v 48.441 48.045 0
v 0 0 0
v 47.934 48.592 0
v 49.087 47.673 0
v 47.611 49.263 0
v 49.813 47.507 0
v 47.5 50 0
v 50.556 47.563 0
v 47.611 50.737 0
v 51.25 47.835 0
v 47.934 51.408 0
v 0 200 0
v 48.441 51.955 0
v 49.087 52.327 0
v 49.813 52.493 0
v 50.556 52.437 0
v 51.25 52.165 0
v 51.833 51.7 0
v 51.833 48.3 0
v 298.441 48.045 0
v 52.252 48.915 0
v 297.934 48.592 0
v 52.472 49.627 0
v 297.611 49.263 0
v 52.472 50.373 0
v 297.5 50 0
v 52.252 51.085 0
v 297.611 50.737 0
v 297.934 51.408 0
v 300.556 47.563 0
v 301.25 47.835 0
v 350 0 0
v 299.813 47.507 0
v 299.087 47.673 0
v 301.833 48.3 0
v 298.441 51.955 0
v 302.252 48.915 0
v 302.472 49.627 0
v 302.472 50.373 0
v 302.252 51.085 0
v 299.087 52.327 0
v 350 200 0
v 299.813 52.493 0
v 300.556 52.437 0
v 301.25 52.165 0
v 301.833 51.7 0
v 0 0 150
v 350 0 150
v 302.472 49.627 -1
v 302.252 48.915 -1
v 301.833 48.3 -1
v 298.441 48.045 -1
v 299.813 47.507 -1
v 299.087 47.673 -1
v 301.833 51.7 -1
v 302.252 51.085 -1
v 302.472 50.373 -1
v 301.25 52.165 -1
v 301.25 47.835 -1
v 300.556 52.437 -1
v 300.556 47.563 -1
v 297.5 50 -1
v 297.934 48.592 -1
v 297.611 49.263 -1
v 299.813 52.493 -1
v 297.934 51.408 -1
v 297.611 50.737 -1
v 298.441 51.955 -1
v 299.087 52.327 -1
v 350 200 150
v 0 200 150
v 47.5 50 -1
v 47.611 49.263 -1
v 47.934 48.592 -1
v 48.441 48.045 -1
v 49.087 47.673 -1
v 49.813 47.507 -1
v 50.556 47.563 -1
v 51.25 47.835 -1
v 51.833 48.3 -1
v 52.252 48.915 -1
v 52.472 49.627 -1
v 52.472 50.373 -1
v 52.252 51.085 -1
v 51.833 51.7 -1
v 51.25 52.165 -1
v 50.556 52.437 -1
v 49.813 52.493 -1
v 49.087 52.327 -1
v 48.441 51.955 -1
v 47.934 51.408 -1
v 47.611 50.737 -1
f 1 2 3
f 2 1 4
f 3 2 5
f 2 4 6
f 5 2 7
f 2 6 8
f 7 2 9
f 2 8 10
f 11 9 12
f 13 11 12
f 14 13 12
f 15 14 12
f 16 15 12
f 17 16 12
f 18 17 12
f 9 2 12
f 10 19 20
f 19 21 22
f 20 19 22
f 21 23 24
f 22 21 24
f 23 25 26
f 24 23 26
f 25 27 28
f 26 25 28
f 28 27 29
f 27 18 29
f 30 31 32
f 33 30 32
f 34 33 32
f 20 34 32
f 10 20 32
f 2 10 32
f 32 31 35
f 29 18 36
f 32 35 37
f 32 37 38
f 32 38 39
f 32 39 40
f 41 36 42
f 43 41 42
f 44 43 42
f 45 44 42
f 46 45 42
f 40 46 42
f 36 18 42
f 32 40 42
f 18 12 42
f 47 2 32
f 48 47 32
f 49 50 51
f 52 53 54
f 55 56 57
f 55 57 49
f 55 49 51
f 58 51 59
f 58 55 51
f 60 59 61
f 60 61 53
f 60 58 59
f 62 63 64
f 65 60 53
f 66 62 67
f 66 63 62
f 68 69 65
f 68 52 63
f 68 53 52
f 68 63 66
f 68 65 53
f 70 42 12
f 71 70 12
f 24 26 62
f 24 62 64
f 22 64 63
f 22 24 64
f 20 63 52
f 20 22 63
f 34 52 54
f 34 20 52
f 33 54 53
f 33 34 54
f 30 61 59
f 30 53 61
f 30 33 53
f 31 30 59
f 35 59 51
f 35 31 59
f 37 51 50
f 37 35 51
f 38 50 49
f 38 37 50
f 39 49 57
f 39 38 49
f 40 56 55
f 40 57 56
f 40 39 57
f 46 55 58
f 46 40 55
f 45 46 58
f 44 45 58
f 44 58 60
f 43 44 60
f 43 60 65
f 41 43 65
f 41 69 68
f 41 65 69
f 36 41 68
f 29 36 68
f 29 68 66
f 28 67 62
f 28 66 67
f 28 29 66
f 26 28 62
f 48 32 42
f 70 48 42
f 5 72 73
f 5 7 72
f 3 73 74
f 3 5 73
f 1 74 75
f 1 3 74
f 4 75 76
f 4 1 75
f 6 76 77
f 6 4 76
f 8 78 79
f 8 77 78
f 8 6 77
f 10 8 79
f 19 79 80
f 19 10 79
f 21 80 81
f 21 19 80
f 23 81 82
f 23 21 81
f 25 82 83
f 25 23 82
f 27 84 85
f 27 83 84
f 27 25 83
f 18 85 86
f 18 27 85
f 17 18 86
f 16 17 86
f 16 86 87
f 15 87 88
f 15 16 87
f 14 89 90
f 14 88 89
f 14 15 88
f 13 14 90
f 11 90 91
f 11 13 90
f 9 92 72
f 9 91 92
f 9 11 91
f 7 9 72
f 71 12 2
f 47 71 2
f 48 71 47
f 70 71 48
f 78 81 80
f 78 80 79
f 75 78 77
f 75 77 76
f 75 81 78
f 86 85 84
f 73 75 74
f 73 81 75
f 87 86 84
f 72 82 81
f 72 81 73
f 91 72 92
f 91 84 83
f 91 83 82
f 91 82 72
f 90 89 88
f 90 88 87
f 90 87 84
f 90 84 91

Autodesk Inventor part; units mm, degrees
ref_plane "YZ Plane" through (0, 0, 0) normal (1, 0, 0) x (0, 1, 0)
ref_plane "XZ Plane" through (0, 0, 0) normal (0, 1, 0) x (-1, 0, 0)
ref_plane "XY Plane" through (0, 0, 0) normal (0, 0, 1) x (1, 0, 0)
sketch "スケッチ1" plane through (0, 0, 0) normal (0, 0, 1) x (1, 0, 0)
  line L0 (0, 0) -> (350, 0)
  line L1 (350, 0) -> (350, 200)
  line L2 (350, 200) -> (0, 200)
  line L3 (0, 200) -> (0, 0)
  dimension "d0" = 350
  dimension "d1" = 200
extrude "押し出し1" add sketch "スケッチ1" along normal blind 150
sketch "スケッチ2" plane through (0, 0, 0) normal (0, 0, -1) x (-1, 0, 0)
  circle A0 centre (-300, 50) radius 2.5
  circle A1 centre (-50, 50) radius 2.5
  line L0 (0, 0) -> (-350, 0) projected
  line L1 (-350, 0) -> (-350, 200) projected
  dimension "d4" = 50
  dimension "d5" = 50
  dimension "d6" = 250
  dimension "d7" = 50
  dimension "d8" = 5
  dimension "d9" = 5
extrude "押し出し2" add sketch "スケッチ2" along normal blind 1
equation "\"d5\" = d4"
equation "\"d9\" = d8"
properties part number "bearing_10"
